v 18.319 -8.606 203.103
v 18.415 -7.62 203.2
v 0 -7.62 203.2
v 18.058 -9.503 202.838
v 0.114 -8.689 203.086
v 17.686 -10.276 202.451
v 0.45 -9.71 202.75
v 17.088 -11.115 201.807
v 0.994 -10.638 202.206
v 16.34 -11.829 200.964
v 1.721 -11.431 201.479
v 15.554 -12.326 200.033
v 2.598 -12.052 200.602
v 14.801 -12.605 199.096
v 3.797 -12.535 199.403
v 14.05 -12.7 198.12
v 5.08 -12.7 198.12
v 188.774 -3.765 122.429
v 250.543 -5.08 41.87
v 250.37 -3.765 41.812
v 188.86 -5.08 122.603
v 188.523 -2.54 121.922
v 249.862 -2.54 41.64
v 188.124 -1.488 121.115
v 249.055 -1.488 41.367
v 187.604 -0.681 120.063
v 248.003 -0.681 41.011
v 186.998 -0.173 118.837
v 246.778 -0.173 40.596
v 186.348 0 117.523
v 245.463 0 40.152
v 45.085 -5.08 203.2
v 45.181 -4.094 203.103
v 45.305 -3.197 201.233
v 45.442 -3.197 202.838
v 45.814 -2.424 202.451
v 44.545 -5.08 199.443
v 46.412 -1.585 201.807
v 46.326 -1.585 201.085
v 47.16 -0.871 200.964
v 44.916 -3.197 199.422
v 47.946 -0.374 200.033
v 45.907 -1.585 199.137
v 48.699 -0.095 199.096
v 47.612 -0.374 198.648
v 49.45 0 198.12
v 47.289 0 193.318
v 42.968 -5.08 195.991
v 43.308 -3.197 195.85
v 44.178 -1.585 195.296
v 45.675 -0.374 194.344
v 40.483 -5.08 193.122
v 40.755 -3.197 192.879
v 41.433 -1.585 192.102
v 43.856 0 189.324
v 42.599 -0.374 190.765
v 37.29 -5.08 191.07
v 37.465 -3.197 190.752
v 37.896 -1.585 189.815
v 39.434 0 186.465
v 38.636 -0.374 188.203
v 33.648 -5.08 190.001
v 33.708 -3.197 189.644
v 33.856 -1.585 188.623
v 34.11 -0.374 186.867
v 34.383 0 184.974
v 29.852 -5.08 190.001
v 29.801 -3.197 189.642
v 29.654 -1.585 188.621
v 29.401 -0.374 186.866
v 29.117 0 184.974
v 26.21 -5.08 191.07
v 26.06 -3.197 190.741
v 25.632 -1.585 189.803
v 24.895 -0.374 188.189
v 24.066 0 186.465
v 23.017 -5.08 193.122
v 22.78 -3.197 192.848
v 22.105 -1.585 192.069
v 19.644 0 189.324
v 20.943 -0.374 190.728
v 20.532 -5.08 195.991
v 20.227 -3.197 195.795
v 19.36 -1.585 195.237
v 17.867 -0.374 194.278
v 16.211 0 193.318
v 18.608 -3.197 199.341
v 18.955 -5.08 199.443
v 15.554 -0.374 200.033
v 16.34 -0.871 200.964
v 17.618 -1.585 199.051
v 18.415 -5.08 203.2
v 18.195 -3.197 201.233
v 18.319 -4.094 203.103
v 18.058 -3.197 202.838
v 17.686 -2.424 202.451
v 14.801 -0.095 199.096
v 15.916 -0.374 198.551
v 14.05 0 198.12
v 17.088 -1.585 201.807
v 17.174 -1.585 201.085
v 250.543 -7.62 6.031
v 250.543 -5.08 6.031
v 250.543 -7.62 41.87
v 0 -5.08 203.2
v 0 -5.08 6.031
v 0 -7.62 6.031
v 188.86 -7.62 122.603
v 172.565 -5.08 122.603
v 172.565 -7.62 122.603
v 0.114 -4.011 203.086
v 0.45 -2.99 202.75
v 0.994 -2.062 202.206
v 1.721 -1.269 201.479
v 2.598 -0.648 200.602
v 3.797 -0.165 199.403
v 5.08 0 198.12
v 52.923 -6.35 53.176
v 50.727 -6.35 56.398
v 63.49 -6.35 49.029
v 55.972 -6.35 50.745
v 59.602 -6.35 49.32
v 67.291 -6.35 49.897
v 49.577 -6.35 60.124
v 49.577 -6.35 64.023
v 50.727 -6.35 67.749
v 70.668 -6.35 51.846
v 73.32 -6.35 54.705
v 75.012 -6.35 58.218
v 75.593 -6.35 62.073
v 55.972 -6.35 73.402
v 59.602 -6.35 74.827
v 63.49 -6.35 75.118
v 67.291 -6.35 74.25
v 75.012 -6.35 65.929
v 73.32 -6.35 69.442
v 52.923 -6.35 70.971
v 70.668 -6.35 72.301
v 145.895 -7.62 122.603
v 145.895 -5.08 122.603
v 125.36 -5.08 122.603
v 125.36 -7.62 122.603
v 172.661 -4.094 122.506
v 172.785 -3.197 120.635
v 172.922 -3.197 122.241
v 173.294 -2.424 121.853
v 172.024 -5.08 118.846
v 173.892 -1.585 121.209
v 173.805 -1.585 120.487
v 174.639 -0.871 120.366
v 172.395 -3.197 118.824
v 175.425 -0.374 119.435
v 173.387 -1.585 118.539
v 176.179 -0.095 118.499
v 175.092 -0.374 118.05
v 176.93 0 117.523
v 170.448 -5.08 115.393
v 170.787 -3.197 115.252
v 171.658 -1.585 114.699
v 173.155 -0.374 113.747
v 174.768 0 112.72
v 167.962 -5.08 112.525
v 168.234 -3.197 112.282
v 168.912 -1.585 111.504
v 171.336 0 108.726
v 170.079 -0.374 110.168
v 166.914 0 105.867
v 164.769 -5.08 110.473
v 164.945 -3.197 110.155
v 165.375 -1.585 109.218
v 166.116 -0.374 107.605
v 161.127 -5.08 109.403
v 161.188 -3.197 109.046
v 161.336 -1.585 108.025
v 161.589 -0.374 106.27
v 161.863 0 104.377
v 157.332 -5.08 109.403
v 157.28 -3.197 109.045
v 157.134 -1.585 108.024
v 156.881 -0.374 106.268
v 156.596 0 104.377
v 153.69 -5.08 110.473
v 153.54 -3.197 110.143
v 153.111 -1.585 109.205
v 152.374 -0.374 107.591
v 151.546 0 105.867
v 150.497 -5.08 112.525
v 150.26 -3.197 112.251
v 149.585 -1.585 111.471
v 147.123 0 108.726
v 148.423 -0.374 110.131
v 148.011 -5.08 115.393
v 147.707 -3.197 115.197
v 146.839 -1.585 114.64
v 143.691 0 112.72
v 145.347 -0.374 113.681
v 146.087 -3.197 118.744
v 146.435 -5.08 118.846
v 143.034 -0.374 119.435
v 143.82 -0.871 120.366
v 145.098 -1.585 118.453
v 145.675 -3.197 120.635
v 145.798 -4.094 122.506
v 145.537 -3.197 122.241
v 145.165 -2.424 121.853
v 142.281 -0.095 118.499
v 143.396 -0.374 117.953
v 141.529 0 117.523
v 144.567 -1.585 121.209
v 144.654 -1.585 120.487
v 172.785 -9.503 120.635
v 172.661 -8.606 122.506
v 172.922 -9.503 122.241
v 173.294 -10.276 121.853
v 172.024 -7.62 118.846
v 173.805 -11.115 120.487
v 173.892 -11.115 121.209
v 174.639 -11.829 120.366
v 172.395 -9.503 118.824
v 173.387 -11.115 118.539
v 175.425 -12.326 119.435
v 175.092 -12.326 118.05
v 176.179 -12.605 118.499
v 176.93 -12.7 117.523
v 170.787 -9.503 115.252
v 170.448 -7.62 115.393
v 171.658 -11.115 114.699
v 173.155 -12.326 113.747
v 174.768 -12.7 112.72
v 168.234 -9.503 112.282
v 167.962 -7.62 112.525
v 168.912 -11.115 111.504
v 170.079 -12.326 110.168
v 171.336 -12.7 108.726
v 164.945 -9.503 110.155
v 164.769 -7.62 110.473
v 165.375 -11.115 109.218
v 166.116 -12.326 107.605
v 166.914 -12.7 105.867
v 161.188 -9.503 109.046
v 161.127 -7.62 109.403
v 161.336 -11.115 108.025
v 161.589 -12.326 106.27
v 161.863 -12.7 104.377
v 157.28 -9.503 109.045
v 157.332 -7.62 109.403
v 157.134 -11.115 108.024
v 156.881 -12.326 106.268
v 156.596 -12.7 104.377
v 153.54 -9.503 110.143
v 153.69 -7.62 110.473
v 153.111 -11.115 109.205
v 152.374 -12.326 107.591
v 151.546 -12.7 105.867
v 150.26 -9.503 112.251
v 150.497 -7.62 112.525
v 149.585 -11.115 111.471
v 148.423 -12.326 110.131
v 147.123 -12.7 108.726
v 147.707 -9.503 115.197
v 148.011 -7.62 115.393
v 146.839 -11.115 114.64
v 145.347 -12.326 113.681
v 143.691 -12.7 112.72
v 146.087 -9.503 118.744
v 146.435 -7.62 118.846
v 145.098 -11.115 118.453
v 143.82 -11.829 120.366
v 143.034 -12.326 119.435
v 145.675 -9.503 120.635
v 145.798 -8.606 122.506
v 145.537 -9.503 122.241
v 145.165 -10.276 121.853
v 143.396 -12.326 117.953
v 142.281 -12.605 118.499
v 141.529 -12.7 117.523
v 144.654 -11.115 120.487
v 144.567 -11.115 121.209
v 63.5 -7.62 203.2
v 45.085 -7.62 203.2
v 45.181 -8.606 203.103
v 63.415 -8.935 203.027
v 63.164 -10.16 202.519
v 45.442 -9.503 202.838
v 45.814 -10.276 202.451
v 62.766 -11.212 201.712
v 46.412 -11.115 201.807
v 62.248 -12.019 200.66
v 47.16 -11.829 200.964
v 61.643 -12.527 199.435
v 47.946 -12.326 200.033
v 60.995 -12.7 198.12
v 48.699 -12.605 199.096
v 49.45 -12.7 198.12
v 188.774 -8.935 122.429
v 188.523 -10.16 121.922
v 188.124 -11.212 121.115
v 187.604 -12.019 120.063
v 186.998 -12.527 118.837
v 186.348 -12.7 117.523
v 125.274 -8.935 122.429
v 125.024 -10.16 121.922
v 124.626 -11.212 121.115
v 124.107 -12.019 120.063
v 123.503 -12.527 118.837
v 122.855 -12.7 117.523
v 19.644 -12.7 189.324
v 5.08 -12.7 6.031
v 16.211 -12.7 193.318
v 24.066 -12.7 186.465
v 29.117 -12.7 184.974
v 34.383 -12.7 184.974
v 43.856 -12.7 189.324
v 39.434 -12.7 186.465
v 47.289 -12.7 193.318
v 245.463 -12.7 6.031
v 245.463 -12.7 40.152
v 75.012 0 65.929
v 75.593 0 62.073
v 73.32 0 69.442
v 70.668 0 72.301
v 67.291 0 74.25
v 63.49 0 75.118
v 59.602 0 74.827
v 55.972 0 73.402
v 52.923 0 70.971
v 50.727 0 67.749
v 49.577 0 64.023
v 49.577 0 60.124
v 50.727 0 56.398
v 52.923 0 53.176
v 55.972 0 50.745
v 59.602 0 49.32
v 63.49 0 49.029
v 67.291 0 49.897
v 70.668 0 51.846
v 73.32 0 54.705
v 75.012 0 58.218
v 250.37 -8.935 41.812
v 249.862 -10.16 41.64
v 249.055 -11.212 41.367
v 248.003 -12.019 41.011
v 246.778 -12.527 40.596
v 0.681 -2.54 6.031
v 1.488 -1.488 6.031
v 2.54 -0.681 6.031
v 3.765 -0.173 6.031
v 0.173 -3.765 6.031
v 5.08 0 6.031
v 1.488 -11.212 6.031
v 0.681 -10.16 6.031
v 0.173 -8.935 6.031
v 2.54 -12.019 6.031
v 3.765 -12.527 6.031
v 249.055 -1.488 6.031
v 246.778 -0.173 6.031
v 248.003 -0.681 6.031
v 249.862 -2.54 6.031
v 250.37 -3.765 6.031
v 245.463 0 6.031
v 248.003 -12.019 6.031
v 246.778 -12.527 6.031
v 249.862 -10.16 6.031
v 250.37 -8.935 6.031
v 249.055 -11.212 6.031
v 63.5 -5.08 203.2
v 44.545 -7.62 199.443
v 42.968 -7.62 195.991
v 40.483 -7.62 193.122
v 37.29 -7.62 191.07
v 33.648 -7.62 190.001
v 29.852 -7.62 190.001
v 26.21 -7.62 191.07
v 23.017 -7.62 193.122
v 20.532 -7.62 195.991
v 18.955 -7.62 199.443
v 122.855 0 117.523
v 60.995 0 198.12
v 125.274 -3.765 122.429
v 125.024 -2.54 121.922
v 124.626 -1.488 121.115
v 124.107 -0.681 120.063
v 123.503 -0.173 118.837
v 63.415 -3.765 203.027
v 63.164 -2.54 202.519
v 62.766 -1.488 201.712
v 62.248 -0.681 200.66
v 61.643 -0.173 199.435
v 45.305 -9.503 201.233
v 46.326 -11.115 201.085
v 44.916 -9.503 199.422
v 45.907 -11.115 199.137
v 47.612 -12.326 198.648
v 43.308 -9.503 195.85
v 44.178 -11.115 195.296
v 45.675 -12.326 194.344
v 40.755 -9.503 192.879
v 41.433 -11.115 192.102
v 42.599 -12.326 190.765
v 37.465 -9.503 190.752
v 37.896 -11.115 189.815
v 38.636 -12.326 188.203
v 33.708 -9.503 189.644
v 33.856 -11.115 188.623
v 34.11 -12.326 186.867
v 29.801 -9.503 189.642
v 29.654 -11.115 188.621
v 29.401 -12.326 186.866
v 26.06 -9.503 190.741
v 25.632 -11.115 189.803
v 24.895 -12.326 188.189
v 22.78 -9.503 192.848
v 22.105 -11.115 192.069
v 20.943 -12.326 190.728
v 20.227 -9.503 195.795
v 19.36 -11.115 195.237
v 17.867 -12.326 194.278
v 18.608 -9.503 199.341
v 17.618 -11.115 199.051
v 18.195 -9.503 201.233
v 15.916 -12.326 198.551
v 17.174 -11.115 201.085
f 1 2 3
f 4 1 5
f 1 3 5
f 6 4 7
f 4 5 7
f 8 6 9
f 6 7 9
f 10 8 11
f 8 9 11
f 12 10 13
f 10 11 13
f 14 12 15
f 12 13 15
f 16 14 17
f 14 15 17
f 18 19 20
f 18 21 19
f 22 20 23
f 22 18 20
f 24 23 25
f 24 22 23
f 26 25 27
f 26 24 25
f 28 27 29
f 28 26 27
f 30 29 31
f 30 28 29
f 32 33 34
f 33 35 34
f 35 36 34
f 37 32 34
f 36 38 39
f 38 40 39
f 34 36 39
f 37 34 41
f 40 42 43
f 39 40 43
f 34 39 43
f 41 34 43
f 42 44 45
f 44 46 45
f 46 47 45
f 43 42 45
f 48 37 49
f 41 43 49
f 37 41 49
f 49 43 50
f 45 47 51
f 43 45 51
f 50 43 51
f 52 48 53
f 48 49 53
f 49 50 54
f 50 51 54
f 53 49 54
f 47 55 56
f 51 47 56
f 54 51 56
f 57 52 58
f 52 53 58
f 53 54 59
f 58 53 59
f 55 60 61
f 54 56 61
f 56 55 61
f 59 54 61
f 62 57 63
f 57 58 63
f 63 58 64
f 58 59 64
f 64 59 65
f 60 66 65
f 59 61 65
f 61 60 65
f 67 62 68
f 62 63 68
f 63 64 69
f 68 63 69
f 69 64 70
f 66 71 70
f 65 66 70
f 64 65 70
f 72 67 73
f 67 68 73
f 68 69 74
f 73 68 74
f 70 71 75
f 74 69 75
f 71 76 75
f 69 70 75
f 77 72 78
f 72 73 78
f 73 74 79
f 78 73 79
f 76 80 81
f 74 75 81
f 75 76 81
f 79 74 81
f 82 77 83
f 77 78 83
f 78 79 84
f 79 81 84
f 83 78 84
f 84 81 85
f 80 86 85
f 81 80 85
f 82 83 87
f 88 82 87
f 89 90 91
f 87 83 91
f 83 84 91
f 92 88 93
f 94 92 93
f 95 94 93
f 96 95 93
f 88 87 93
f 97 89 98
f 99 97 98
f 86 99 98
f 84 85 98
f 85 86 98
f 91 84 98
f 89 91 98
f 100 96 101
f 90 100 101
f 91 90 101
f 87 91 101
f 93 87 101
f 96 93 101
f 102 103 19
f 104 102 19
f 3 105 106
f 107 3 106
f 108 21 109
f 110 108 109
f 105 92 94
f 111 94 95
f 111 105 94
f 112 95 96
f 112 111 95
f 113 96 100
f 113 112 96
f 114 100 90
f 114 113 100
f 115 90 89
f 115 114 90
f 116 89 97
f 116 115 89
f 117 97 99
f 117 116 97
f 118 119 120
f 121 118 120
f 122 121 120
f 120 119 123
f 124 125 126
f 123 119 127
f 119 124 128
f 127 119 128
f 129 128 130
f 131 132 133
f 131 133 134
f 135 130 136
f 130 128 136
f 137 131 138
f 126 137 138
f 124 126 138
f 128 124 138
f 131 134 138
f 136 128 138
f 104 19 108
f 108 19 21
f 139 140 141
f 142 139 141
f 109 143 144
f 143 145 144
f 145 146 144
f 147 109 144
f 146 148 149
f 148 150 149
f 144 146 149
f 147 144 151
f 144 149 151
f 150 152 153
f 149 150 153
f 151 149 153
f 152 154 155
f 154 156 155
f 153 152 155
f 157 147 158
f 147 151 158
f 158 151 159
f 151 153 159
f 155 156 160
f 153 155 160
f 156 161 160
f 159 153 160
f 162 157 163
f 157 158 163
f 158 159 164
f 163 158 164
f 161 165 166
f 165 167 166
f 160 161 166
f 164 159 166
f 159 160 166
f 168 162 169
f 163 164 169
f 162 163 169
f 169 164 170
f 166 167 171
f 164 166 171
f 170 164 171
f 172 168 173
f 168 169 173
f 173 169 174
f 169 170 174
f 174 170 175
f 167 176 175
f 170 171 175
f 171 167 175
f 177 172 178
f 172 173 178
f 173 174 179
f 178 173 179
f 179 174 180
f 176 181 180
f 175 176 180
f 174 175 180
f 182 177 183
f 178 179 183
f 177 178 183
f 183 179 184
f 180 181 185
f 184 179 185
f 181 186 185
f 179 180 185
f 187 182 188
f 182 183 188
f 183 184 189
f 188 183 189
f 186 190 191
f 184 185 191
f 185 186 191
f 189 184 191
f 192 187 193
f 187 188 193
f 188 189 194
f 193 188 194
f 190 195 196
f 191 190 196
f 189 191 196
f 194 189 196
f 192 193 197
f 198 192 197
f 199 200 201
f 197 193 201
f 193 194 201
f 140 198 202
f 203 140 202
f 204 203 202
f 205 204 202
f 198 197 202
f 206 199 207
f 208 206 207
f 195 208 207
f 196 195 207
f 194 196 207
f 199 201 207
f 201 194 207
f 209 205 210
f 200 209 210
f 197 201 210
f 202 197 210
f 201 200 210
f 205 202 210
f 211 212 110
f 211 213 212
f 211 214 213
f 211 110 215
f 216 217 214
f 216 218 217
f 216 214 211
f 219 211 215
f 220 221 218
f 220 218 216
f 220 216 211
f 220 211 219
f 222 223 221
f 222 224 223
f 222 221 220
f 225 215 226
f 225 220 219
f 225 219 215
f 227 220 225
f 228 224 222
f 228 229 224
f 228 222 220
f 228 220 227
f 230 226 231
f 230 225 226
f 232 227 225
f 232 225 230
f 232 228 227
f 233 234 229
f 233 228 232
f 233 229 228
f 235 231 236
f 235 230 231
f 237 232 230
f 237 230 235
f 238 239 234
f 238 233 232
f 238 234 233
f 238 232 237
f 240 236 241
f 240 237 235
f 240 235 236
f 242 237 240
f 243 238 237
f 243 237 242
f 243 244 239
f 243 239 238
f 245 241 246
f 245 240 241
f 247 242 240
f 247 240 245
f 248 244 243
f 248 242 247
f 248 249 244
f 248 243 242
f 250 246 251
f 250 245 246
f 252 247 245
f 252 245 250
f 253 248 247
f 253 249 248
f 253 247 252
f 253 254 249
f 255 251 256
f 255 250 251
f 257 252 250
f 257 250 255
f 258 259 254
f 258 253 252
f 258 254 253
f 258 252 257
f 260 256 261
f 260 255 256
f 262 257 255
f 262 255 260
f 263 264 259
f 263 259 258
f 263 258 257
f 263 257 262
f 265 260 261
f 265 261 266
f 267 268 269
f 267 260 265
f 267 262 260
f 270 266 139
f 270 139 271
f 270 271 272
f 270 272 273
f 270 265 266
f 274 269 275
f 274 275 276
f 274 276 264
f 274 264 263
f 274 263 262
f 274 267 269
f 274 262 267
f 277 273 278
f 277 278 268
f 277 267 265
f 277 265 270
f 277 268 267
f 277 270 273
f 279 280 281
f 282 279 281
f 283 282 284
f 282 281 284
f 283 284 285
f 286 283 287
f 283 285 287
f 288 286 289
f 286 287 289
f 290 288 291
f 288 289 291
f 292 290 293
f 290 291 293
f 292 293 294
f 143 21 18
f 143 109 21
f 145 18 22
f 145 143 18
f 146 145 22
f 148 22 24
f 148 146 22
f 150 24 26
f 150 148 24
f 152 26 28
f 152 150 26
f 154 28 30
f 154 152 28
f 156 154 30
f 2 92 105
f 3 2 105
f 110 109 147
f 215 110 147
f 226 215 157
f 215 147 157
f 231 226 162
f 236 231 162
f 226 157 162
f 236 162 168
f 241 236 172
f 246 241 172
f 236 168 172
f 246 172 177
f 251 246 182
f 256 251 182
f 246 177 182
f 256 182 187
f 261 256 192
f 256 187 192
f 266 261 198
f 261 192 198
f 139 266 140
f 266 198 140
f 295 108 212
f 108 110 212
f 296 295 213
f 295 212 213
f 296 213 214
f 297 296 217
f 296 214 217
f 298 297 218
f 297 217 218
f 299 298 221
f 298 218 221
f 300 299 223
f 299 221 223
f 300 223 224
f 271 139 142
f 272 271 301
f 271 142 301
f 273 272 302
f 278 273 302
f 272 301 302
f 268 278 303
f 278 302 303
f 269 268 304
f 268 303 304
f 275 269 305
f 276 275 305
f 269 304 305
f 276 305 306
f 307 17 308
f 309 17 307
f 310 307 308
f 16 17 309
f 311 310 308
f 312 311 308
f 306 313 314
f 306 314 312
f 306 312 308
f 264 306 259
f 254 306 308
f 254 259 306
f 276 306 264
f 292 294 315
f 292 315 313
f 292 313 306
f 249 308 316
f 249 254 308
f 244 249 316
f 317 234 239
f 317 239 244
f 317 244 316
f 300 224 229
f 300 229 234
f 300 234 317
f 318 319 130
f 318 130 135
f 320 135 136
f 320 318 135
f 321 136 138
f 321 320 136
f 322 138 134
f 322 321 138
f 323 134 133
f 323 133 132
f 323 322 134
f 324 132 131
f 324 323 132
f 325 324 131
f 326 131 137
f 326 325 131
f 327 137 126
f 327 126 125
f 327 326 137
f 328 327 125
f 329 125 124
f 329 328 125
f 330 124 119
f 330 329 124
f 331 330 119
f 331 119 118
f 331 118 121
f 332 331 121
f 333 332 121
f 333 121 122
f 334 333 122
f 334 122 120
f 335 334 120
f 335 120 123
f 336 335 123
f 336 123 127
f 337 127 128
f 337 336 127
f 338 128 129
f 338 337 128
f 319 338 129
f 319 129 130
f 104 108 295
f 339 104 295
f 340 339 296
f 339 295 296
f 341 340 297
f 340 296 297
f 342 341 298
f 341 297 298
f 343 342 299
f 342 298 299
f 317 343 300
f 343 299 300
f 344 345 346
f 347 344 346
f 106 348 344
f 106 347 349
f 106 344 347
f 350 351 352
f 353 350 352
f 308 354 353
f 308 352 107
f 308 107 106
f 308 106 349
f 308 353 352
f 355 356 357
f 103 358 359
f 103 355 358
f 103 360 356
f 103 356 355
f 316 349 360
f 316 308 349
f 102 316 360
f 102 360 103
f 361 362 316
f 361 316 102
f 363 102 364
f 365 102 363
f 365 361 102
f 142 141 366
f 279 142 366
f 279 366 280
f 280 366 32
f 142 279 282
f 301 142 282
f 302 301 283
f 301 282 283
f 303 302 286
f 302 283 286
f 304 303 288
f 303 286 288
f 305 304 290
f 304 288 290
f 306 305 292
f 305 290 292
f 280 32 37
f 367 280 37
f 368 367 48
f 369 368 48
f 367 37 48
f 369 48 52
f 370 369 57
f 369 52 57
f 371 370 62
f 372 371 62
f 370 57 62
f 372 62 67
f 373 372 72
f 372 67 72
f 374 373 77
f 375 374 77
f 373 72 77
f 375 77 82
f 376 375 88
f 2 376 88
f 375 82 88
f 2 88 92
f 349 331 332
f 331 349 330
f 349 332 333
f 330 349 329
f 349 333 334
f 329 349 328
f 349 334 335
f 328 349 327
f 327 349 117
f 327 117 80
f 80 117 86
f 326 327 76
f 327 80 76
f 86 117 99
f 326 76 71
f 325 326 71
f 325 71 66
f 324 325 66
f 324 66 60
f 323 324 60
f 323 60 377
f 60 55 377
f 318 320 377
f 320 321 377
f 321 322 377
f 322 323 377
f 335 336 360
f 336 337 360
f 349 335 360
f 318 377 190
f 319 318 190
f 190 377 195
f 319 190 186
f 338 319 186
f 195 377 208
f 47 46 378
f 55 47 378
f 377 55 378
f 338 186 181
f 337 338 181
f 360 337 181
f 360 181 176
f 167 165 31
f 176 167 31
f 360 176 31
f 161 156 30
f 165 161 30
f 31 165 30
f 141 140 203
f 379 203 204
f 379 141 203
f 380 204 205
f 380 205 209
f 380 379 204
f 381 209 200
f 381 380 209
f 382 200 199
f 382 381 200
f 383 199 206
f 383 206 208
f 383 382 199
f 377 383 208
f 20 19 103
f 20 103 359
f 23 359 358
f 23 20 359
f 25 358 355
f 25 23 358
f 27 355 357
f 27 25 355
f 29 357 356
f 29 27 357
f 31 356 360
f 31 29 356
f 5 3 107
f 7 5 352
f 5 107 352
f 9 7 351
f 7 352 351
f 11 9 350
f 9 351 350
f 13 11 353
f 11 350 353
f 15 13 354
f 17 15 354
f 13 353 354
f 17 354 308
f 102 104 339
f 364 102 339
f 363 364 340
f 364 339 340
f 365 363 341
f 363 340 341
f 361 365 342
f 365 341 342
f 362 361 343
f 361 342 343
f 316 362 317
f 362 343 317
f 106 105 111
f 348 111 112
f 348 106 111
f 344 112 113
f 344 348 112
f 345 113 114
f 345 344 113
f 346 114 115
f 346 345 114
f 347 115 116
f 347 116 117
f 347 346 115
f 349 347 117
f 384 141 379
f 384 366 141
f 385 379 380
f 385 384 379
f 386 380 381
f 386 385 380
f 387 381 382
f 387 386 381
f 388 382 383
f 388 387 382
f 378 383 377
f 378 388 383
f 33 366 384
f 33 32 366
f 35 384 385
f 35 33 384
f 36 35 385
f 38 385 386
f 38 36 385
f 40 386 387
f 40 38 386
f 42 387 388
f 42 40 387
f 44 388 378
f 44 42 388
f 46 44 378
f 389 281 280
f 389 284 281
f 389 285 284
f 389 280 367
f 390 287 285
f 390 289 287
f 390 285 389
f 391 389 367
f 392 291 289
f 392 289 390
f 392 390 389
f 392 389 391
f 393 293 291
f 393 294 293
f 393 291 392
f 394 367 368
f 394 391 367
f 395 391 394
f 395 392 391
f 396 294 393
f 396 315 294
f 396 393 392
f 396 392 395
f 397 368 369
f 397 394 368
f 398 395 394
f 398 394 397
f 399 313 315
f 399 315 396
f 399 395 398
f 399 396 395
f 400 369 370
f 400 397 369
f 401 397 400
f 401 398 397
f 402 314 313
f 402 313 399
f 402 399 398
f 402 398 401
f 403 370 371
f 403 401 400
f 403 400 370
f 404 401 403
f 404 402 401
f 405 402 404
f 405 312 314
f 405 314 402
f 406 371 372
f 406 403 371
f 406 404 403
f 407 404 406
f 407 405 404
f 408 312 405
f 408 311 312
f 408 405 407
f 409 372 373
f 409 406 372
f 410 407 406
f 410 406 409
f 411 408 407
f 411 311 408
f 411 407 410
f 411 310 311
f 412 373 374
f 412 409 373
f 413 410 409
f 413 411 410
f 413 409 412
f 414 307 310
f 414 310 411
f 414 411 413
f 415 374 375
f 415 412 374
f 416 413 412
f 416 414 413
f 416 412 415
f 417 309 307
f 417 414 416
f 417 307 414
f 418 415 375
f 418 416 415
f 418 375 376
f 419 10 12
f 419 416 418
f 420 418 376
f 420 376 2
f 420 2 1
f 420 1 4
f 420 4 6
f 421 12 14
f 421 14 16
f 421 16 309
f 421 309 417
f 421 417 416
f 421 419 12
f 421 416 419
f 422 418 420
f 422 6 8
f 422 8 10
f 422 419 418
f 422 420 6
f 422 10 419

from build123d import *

# Parameters (mm, degrees)
F1_DEPTH = 12.7
F2_R     = 5.08
F3_W     = 402.312346
F3_H     = 25.619045
F4_DEPTH = 73.66
F5_R     = 13.081
F6_DEPTH = 6.35


with BuildPart() as f1:
    # F0 (on Front) → F1 (new body)
    with BuildSketch(Plane.XZ):
        with BuildLine():
            Line((0, 203.2), (0, 0))
            Line((0, 0), (250.542982, 0))
            Line((250.542982, 0), (250.542982, 41.870144))
            Line((250.542982, 41.870144), (188.859552, 122.602507))
            Line((188.859552, 122.602507), (172.564591, 122.602507))
            ThreePointArc((172.564591, 122.602507), (159.229591, 109.267507), (145.894591, 122.602507))
            Line((145.894591, 122.602507), (125.359552, 122.602507))
            Line((125.359552, 122.602507), (63.5, 203.2))
            Line((63.5, 203.2), (45.085, 203.2))
            ThreePointArc((45.085, 203.2), (31.75, 189.865), (18.415, 203.2))
            Line((18.415, 203.2), (0, 203.2))
        make_face()
    extrude(amount=F1_DEPTH)

    # F2
    f2_edges = [f1.edges().sort_by_distance(p)[0] for p in [
        (0, -12.7, 101.6),
        (125.271491, -12.7, 0),
        (250.542982, -12.7, 20.935072),
        (219.701267, -12.7, 82.236326),
        (180.712072, -12.7, 122.602507),
        (159.229591, -12.7, 109.267507),
        (135.627072, -12.7, 122.602507),
        (94.429776, -12.7, 162.901254),
        (54.2925, -12.7, 203.2),
        (31.75, -12.7, 189.865),
        (9.2075, -12.7, 203.2),
        (0, 0, 101.6),
        (125.271491, 0, 0),
        (250.542982, 0, 20.935072),
        (219.701267, 0, 82.236326),
        (180.712072, 0, 122.602507),
        (159.229591, 0, 109.267507),
        (135.627072, 0, 122.602507),
        (94.429776, 0, 162.901254),
        (54.2925, 0, 203.2),
        (31.75, 0, 189.865),
        (9.2075, 0, 203.2),
    ]]
    fillet(f2_edges, radius=F2_R)

    # F3 (on Front) → F4 (cut, symmetric)
    with BuildSketch(Plane.XZ):
        with Locations((92.536684, -6.778551)):
            Rectangle(F3_W, F3_H)
    extrude(amount=F4_DEPTH, both=True, mode=Mode.SUBTRACT)

    # F5 (on Front) → F6 (cut)
    with BuildSketch(Plane.XZ):
        with Locations((62.512301, 62.07348)):
            Circle(F5_R)
    extrude(amount=F6_DEPTH, mode=Mode.SUBTRACT)


solid = f1.part
